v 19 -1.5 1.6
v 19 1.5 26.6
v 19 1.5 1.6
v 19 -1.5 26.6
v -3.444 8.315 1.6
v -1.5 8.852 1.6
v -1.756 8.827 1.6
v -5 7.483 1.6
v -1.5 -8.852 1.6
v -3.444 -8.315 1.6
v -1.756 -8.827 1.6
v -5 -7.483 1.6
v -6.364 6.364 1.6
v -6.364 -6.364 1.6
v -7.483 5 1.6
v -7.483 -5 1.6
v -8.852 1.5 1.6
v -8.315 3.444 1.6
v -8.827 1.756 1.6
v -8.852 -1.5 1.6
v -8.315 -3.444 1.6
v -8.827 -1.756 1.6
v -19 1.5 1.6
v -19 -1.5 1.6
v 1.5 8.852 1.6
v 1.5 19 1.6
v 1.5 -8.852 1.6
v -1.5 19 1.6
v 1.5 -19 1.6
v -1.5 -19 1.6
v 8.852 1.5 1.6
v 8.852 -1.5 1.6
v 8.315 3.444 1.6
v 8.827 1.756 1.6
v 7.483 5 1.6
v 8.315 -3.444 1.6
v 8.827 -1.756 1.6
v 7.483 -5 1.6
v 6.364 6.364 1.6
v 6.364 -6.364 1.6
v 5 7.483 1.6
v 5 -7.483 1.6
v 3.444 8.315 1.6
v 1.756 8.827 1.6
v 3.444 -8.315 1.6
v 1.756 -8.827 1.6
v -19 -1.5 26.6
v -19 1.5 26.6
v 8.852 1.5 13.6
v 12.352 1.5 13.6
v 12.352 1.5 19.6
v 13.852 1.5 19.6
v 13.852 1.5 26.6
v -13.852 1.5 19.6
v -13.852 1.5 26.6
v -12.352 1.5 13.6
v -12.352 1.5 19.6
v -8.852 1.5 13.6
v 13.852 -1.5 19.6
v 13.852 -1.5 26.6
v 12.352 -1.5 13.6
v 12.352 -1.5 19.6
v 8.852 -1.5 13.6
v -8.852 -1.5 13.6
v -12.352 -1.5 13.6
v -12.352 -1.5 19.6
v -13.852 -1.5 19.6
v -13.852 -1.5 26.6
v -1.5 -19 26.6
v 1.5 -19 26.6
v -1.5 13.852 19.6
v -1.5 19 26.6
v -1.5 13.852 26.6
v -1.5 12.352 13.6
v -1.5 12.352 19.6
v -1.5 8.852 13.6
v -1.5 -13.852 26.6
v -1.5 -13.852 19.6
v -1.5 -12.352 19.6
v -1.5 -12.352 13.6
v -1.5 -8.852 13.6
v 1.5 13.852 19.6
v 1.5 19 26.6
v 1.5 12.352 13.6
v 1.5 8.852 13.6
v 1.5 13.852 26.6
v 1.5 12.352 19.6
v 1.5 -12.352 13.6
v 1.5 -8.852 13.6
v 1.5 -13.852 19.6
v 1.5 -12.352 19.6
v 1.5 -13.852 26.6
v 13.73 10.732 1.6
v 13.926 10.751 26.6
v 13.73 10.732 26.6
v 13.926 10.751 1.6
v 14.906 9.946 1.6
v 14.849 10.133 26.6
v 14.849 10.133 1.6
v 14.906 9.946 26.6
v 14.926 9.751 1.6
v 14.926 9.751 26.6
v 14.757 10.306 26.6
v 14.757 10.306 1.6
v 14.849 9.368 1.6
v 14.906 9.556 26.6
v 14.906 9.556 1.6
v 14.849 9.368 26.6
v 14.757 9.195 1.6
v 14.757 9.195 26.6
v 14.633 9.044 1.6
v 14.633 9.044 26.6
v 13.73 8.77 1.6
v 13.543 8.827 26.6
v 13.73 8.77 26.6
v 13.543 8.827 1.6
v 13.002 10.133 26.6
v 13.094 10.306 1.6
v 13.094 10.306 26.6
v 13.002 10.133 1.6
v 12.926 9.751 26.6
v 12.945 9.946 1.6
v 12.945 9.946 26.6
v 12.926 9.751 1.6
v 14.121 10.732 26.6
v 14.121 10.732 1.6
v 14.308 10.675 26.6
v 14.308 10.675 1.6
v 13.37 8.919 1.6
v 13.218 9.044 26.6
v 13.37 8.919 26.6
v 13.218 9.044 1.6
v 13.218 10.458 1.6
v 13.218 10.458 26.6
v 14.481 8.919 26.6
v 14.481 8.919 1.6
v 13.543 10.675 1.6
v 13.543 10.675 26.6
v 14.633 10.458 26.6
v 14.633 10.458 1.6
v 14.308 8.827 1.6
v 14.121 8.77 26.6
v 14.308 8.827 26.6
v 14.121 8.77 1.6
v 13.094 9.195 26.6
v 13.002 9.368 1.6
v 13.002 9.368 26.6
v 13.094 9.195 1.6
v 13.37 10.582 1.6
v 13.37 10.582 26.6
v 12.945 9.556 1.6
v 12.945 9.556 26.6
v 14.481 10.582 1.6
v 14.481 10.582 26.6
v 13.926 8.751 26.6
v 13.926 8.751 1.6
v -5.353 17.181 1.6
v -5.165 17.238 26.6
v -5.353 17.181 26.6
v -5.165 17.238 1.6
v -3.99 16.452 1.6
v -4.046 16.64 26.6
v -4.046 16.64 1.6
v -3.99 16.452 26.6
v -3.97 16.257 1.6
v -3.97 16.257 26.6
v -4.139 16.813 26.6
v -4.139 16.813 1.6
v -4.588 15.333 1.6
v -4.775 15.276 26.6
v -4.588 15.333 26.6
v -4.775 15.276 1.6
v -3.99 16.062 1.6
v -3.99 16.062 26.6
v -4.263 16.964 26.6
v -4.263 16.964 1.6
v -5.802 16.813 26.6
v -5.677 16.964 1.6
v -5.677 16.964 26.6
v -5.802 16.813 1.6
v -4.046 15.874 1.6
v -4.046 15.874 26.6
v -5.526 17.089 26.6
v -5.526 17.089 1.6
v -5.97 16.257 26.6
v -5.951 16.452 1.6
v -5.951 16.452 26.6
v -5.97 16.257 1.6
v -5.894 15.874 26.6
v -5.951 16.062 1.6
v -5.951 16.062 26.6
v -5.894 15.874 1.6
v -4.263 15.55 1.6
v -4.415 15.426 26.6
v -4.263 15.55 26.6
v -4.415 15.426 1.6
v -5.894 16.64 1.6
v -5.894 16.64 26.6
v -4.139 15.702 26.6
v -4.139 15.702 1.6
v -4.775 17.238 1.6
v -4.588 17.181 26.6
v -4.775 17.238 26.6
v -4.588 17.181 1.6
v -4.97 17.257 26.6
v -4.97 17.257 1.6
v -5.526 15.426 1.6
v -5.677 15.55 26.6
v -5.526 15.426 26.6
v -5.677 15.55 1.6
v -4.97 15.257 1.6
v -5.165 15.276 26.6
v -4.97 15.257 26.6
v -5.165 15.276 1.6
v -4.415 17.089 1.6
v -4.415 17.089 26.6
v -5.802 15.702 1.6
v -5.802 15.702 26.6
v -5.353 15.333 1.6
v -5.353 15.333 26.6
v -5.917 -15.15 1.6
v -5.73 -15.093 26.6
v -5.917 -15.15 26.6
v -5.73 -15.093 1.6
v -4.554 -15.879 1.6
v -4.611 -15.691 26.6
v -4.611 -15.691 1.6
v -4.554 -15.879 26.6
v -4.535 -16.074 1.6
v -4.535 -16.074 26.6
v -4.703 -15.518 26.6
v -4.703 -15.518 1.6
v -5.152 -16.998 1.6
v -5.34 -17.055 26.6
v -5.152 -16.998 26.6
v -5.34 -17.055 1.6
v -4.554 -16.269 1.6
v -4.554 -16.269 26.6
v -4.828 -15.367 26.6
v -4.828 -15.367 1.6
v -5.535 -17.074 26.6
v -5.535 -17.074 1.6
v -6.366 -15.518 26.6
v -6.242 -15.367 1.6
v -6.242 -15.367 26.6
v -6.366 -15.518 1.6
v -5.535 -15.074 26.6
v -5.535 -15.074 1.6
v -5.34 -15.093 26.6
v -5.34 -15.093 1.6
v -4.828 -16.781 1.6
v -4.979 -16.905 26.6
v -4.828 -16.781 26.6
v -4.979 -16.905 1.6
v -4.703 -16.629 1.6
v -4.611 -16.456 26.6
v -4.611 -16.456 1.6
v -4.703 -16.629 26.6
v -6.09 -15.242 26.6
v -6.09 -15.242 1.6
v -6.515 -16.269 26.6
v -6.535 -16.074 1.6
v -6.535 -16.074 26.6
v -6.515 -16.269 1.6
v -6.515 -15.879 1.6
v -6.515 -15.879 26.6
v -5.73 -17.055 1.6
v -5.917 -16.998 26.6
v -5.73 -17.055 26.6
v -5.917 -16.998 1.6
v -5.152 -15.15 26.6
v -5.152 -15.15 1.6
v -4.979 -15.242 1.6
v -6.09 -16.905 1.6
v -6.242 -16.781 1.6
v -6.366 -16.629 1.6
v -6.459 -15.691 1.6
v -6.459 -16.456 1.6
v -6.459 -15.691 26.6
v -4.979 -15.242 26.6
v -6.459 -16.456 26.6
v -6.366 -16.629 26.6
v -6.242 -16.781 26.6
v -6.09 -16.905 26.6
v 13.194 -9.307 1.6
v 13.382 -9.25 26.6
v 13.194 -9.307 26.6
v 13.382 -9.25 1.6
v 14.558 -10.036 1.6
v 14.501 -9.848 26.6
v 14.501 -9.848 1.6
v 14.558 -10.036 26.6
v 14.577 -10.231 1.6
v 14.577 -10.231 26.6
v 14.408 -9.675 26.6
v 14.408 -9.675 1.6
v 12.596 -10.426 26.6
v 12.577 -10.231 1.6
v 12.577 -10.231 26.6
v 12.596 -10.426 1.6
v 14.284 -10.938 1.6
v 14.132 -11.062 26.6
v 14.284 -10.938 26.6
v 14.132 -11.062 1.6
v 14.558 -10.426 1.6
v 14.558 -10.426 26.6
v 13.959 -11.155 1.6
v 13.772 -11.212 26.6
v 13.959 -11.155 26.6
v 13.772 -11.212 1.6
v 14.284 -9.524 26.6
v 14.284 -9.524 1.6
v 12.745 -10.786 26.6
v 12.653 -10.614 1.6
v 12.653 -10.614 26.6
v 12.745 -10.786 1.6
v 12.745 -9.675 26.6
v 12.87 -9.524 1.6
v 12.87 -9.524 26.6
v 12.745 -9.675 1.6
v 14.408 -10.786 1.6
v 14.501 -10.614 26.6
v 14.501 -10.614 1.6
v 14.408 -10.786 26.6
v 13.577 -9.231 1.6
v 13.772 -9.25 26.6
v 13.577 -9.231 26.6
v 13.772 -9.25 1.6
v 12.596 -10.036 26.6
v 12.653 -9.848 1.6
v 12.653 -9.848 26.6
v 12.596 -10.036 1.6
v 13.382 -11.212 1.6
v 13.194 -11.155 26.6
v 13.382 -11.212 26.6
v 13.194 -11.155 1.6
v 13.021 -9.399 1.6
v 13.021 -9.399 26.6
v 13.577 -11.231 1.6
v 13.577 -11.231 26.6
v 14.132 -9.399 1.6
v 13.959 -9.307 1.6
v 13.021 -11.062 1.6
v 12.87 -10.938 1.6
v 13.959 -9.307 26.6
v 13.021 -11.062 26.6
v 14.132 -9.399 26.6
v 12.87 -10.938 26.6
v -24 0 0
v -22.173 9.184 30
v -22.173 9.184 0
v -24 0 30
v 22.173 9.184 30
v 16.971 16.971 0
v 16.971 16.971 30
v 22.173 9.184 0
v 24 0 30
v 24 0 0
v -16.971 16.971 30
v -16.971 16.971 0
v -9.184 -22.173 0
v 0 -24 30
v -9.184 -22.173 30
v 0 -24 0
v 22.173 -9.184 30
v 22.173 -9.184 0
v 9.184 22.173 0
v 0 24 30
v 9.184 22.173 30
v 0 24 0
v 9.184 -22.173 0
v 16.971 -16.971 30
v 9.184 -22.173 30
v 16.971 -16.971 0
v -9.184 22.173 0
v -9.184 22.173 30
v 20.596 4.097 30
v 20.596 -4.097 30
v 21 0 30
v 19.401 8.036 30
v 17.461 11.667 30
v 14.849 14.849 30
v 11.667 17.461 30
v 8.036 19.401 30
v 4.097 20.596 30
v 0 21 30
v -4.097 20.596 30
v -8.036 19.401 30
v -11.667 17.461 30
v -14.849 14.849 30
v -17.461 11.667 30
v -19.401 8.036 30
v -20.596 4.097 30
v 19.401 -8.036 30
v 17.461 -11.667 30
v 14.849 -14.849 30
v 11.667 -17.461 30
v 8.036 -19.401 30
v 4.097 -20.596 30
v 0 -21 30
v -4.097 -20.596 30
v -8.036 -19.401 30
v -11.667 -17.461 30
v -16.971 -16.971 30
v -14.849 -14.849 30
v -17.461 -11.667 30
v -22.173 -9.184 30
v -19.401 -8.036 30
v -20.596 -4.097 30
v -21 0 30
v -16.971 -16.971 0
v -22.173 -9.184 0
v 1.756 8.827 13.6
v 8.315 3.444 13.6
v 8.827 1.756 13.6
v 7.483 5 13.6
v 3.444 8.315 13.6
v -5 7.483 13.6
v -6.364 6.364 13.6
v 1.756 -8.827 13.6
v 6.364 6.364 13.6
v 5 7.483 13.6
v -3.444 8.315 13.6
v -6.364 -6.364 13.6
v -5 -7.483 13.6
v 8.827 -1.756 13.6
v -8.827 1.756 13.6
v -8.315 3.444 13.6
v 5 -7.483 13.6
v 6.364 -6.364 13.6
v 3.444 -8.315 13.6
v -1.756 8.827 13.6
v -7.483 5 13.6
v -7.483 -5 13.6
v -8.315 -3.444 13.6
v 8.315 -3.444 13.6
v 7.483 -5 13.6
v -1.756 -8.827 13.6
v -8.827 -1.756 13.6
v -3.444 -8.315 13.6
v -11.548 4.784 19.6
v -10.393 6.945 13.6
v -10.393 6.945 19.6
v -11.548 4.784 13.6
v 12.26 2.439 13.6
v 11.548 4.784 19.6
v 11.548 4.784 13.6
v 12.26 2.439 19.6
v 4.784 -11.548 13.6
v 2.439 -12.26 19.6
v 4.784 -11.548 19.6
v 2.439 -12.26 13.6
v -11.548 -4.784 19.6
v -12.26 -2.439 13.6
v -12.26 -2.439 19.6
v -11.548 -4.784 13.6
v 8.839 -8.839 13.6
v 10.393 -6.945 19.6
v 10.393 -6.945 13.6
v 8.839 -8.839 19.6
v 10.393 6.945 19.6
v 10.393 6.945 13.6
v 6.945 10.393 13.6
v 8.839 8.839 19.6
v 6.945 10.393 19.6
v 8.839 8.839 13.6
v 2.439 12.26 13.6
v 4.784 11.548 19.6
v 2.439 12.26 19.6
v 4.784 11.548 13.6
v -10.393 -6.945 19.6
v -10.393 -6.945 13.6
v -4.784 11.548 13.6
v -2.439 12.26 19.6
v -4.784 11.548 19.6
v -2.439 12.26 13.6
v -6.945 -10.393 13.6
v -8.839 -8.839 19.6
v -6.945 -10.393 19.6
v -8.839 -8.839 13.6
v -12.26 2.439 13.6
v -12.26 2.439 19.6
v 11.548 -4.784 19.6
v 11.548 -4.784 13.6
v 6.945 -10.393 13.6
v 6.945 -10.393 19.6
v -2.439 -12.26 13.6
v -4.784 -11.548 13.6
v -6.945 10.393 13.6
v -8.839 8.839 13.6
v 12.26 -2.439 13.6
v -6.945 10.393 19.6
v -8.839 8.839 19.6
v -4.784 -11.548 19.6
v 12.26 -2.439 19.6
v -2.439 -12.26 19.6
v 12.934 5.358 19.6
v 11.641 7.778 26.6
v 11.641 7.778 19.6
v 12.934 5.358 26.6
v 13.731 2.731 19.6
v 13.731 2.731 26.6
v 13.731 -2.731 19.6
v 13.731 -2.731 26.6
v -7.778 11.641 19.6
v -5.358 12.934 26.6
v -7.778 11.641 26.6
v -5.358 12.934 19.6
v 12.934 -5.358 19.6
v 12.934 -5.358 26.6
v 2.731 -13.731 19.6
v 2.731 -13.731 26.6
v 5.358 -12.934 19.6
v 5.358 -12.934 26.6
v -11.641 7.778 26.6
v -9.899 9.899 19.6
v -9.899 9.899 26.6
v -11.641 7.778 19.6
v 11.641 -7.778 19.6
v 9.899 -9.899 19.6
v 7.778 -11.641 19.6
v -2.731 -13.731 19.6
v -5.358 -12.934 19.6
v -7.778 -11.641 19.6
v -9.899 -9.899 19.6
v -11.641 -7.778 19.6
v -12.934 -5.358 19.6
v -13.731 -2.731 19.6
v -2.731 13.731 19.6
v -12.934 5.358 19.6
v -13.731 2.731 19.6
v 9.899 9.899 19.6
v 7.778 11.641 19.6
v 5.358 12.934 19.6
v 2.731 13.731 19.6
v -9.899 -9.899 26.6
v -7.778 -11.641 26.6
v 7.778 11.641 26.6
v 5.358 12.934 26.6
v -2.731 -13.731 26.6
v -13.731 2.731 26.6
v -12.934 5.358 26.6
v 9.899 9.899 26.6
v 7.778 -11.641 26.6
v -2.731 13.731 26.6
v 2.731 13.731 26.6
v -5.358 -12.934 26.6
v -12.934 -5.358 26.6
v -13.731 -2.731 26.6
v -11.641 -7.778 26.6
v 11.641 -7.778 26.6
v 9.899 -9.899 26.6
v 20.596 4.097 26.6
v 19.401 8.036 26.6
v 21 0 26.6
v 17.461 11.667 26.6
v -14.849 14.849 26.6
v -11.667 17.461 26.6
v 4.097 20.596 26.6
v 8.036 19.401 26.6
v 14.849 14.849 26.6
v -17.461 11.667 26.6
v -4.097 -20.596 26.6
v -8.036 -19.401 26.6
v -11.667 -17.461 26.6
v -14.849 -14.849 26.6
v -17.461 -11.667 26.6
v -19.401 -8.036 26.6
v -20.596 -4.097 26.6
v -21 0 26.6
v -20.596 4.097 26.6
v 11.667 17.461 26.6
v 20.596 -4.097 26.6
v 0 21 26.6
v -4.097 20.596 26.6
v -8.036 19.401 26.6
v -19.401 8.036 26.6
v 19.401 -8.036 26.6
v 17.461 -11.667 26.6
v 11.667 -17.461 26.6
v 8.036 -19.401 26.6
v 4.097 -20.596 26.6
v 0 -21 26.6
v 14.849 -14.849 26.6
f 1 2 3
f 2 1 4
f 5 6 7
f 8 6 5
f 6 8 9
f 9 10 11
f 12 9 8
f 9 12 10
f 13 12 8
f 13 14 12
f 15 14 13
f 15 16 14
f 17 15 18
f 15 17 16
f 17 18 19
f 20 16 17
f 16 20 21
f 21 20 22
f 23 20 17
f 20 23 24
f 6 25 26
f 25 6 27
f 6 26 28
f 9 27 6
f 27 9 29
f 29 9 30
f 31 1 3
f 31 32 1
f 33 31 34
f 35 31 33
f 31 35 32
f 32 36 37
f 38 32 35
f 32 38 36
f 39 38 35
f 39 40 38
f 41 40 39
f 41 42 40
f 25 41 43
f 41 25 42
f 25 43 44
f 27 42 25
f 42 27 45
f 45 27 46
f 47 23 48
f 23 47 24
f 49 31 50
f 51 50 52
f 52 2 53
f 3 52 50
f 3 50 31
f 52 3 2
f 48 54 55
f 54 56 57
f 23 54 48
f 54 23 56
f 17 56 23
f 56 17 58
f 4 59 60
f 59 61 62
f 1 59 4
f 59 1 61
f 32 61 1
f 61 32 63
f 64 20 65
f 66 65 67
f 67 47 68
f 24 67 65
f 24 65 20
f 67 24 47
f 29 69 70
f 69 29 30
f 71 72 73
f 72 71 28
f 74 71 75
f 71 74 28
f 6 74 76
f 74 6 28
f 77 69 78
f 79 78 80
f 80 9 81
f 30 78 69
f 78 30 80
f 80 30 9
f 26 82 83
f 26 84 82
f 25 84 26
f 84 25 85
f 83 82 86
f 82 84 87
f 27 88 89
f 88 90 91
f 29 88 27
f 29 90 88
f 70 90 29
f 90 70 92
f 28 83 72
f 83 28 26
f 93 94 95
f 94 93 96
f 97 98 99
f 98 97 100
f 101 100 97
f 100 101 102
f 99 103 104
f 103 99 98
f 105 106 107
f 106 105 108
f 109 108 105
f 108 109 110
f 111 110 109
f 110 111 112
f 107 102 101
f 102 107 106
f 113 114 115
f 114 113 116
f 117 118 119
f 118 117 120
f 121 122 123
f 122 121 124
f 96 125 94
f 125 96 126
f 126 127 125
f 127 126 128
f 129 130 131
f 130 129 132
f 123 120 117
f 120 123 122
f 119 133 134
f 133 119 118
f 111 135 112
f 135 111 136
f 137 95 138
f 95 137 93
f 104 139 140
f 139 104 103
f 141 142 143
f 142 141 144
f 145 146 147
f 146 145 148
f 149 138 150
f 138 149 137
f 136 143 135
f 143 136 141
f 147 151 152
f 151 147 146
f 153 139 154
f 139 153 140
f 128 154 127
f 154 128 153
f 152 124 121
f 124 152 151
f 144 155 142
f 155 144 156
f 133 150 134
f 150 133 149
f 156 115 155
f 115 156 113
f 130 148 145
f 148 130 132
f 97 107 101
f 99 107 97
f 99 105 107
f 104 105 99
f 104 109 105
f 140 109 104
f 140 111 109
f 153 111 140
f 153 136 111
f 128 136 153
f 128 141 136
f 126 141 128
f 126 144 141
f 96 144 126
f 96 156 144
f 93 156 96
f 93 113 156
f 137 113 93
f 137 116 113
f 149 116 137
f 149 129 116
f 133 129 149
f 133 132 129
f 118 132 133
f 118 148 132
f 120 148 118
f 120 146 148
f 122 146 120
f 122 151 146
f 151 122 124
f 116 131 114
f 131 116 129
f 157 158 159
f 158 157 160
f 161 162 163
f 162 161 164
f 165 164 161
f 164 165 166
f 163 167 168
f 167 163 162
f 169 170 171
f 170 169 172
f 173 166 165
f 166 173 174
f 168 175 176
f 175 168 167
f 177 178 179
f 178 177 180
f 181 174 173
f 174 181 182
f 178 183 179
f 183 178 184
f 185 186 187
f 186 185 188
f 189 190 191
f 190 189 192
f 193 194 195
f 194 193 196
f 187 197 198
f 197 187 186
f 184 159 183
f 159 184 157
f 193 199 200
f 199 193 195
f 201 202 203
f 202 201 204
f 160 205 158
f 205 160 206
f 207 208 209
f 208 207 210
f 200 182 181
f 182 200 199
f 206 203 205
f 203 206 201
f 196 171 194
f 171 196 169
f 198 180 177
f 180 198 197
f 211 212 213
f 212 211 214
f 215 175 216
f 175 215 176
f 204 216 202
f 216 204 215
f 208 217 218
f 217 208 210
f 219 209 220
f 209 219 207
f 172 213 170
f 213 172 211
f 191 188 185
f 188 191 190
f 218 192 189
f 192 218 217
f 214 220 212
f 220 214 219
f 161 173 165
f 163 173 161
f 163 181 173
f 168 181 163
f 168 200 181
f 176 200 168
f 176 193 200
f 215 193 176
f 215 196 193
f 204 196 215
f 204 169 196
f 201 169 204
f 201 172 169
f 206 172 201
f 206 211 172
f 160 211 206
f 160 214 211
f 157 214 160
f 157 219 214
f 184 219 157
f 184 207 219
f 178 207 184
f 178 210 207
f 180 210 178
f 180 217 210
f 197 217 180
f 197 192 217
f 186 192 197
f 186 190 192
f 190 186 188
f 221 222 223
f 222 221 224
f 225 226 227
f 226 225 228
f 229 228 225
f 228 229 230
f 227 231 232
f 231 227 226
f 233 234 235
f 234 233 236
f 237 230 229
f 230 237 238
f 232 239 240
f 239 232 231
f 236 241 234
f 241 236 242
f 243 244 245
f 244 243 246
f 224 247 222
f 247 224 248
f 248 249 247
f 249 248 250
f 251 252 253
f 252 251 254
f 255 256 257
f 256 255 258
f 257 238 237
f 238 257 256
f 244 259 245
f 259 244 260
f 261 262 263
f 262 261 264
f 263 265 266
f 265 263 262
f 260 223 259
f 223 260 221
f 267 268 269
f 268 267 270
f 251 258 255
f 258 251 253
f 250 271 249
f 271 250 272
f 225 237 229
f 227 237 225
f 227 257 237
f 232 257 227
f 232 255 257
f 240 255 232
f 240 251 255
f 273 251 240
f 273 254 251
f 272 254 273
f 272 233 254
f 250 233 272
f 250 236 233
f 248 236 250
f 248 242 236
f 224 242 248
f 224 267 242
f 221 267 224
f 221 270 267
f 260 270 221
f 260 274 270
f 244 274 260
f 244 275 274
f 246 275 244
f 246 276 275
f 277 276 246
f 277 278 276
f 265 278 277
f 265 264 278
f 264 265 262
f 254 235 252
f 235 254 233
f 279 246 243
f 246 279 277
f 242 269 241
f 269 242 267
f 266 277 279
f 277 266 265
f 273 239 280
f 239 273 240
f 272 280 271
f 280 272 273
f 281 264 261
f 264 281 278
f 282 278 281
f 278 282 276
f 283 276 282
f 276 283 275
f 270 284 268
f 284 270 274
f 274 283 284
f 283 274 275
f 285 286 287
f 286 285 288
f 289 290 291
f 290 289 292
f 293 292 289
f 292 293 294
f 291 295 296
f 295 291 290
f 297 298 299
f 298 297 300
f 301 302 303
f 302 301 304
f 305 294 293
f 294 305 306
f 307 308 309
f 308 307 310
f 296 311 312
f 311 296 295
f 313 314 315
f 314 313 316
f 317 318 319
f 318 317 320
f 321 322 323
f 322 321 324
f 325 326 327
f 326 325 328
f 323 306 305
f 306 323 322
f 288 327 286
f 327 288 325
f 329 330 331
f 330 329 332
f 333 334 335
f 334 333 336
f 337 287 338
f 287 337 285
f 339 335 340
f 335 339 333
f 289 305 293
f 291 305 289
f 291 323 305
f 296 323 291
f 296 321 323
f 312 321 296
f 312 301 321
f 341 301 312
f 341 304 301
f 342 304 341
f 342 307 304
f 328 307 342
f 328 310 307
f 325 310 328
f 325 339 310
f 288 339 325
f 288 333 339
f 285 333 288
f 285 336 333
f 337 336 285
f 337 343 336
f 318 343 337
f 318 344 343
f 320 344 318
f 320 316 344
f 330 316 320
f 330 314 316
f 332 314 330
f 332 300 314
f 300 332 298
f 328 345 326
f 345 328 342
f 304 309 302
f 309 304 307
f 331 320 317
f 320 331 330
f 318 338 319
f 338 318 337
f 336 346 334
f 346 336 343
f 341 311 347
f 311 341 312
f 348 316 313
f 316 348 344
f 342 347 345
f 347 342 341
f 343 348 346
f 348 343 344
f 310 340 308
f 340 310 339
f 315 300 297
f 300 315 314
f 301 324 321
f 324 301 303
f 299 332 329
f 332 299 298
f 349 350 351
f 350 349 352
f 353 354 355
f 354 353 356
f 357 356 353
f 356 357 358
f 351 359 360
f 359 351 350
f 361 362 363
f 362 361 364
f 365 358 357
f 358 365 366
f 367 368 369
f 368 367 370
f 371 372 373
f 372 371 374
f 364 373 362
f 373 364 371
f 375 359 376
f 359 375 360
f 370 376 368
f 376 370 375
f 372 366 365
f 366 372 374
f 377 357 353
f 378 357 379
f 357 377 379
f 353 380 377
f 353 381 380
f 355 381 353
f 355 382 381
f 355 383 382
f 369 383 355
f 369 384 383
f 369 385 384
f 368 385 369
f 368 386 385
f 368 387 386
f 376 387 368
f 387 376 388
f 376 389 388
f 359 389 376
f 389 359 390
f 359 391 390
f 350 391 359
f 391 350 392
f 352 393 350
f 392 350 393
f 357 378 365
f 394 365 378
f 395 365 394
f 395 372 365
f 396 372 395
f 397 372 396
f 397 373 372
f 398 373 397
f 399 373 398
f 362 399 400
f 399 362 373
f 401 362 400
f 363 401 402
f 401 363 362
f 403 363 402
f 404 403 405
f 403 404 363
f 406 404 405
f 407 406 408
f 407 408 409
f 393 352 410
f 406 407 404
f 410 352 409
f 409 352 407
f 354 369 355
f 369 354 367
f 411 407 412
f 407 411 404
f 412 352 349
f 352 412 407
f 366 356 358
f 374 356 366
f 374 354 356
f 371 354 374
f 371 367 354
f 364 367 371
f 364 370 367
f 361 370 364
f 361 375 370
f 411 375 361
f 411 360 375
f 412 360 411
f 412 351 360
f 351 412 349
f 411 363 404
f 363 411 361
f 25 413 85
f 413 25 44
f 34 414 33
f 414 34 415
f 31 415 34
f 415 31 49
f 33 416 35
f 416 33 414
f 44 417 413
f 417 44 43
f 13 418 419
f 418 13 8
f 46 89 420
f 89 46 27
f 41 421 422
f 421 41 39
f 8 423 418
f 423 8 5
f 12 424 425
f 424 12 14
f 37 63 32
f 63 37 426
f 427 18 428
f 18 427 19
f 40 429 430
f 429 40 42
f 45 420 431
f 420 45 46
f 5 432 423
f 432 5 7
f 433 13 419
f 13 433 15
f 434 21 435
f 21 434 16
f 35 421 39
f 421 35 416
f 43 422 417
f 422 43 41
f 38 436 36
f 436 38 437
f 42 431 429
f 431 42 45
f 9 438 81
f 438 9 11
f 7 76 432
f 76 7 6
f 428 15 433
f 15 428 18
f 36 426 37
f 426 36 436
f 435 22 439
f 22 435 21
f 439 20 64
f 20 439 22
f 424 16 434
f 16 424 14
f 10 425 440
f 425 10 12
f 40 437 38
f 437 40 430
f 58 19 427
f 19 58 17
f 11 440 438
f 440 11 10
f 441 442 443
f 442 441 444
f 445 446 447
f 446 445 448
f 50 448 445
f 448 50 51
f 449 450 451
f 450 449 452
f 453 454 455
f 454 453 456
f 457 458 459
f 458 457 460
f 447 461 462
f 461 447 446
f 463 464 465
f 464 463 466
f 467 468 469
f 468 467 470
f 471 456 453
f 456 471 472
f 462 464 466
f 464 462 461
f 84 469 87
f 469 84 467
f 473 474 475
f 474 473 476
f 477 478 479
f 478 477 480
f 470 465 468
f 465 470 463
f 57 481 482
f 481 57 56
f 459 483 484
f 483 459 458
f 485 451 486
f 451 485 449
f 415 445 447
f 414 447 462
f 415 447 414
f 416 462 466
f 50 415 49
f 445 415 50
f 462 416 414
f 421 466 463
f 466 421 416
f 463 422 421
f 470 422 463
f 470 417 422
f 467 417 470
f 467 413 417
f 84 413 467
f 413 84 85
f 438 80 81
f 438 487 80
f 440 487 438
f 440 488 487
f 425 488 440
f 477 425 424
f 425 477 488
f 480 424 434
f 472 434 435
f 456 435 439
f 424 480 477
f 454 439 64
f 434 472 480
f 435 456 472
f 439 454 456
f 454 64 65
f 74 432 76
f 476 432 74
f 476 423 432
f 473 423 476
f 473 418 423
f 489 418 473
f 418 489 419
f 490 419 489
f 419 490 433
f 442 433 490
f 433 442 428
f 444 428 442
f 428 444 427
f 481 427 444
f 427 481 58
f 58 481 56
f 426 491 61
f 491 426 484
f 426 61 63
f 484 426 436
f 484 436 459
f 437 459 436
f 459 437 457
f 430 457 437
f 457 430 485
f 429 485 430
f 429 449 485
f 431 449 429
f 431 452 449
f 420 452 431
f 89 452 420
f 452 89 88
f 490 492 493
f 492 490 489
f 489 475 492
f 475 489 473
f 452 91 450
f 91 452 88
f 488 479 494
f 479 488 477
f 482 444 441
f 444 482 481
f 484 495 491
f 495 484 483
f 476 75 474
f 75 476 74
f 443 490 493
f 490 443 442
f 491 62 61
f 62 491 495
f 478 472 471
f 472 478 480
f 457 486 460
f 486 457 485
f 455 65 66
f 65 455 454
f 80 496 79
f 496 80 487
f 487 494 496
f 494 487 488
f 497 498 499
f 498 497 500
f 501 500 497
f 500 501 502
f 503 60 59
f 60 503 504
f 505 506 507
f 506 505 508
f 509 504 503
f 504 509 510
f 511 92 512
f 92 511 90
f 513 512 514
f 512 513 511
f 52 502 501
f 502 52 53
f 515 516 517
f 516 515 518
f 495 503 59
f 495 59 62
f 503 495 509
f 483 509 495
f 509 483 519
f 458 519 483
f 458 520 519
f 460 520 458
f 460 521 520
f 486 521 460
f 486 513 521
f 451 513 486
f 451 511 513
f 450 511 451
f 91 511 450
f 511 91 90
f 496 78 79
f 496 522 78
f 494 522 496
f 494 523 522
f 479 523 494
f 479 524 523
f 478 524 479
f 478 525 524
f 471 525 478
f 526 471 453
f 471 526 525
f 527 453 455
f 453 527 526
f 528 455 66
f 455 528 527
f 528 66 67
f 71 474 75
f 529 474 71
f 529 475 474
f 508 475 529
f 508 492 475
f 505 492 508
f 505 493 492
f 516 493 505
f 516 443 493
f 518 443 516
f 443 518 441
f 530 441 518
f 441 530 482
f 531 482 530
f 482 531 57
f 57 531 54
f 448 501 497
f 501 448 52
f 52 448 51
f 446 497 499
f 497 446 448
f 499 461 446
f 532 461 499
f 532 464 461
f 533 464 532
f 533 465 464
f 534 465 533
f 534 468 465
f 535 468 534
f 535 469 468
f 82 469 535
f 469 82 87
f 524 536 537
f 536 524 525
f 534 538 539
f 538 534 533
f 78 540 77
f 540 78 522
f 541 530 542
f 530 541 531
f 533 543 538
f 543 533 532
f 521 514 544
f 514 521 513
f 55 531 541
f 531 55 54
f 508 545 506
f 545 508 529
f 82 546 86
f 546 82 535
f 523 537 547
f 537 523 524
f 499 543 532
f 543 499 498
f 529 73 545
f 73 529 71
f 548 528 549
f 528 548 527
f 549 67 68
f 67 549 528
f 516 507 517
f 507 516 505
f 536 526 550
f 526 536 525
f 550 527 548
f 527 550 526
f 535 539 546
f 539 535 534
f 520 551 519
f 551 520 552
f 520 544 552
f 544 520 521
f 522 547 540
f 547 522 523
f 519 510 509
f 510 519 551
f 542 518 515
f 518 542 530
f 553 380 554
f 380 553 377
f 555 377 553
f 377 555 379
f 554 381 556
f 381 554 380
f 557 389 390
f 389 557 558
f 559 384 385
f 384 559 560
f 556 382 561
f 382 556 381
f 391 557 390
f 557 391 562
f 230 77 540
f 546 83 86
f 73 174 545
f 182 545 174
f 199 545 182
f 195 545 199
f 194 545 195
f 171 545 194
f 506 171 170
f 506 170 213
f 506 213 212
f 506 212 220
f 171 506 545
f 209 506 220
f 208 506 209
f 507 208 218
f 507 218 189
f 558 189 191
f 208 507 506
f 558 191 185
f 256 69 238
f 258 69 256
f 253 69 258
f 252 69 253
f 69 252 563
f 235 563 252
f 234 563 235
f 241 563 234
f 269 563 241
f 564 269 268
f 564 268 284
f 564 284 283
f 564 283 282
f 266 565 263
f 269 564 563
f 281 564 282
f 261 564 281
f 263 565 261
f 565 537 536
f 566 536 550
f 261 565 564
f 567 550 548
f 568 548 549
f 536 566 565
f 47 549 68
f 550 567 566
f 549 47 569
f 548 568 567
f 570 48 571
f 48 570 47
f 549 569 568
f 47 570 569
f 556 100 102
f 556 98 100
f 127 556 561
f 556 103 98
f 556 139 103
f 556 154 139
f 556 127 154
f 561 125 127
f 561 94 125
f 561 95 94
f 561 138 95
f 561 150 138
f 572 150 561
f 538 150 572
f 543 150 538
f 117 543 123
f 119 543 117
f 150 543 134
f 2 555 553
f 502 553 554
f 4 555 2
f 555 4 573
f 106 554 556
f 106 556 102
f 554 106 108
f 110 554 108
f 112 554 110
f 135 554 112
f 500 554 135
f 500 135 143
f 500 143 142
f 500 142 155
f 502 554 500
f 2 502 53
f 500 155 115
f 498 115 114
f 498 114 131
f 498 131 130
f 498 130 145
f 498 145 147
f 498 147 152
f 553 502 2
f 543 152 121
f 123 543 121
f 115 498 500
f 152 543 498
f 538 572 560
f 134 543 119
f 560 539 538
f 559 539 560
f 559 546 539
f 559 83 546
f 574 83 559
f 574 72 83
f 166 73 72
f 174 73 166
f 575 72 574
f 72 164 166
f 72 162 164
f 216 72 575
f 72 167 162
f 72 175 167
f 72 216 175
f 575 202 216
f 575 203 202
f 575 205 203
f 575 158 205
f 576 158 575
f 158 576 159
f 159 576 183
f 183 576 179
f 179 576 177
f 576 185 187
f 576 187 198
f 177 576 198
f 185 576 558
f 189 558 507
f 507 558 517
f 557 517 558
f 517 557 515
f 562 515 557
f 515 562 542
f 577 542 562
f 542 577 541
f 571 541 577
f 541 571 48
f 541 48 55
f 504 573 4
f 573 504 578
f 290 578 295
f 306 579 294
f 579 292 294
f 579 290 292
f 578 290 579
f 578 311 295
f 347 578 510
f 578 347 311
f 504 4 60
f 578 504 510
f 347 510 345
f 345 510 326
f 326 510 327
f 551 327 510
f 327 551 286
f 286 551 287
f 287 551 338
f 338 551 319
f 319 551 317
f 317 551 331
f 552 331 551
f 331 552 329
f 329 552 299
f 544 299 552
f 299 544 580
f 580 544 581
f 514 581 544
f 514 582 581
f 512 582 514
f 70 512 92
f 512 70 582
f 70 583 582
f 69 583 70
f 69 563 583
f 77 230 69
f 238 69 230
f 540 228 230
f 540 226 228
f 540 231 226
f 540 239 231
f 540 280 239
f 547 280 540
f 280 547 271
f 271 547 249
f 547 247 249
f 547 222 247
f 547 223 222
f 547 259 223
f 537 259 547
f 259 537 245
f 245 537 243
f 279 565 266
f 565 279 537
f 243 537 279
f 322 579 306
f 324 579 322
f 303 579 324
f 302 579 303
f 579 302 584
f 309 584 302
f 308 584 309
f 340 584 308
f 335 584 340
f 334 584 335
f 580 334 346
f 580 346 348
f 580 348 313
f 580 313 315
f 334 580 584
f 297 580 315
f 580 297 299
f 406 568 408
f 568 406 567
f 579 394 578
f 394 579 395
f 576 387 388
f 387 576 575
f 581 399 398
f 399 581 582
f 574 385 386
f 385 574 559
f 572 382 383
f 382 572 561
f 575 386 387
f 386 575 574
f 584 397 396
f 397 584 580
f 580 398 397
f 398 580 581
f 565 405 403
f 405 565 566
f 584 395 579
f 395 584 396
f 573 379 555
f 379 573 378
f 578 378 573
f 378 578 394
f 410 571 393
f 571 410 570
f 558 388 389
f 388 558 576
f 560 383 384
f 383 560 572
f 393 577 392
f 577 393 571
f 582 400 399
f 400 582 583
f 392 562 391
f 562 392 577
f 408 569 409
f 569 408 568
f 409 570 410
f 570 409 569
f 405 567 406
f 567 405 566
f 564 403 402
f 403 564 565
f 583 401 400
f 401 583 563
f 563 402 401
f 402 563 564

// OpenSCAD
/**
 * print settings:
 * - perimeters: 4
 * - bottom solid layers: 4
 *
 * material: petg
 * not material: pla (temperature issues)
 */

$fn = 32;

thickness = 1.6;

bolt_angle = 360 / 5;
bolt_l = 17;
bolt_d = 2;

d = 48;
h = 30;

d1 = 18;
h1 = 12;

d2 = 25;
h2 = h1 + 6;

d3 = 28;
h3 = h2 + 7;

d4 = 32 + 5 * bolt_d;

function polar_to_cartesian(length, angle) = [length * cos(angle), length * sin(angle)];

difference() {
  cylinder(h = h, d = d, $fn = 16);
  translate([0, 0, thickness])
    cylinder(h = h , d = d1);
  for (i = [0, 90]) {
    rotate([0, 0, i])
      translate([-d1 / 2 - 10, -1.5, thickness])
        cube([d1 + 20, 3, h]);
  }
  translate([0, 0, thickness + h1])
    cylinder(h = h, d = d2);
  translate([0, 0, thickness + h2])
    cylinder(h = h, d = d3);
  for (i = [0:4]) {
    coord = polar_to_cartesian(bolt_l, bolt_angle * i + 35);
    translate([coord[0], coord[1], thickness])
      cylinder(d = bolt_d, h = h);
  }
  translate([0, 0, thickness + h3])
    cylinder(h = h, d = d4);
}
